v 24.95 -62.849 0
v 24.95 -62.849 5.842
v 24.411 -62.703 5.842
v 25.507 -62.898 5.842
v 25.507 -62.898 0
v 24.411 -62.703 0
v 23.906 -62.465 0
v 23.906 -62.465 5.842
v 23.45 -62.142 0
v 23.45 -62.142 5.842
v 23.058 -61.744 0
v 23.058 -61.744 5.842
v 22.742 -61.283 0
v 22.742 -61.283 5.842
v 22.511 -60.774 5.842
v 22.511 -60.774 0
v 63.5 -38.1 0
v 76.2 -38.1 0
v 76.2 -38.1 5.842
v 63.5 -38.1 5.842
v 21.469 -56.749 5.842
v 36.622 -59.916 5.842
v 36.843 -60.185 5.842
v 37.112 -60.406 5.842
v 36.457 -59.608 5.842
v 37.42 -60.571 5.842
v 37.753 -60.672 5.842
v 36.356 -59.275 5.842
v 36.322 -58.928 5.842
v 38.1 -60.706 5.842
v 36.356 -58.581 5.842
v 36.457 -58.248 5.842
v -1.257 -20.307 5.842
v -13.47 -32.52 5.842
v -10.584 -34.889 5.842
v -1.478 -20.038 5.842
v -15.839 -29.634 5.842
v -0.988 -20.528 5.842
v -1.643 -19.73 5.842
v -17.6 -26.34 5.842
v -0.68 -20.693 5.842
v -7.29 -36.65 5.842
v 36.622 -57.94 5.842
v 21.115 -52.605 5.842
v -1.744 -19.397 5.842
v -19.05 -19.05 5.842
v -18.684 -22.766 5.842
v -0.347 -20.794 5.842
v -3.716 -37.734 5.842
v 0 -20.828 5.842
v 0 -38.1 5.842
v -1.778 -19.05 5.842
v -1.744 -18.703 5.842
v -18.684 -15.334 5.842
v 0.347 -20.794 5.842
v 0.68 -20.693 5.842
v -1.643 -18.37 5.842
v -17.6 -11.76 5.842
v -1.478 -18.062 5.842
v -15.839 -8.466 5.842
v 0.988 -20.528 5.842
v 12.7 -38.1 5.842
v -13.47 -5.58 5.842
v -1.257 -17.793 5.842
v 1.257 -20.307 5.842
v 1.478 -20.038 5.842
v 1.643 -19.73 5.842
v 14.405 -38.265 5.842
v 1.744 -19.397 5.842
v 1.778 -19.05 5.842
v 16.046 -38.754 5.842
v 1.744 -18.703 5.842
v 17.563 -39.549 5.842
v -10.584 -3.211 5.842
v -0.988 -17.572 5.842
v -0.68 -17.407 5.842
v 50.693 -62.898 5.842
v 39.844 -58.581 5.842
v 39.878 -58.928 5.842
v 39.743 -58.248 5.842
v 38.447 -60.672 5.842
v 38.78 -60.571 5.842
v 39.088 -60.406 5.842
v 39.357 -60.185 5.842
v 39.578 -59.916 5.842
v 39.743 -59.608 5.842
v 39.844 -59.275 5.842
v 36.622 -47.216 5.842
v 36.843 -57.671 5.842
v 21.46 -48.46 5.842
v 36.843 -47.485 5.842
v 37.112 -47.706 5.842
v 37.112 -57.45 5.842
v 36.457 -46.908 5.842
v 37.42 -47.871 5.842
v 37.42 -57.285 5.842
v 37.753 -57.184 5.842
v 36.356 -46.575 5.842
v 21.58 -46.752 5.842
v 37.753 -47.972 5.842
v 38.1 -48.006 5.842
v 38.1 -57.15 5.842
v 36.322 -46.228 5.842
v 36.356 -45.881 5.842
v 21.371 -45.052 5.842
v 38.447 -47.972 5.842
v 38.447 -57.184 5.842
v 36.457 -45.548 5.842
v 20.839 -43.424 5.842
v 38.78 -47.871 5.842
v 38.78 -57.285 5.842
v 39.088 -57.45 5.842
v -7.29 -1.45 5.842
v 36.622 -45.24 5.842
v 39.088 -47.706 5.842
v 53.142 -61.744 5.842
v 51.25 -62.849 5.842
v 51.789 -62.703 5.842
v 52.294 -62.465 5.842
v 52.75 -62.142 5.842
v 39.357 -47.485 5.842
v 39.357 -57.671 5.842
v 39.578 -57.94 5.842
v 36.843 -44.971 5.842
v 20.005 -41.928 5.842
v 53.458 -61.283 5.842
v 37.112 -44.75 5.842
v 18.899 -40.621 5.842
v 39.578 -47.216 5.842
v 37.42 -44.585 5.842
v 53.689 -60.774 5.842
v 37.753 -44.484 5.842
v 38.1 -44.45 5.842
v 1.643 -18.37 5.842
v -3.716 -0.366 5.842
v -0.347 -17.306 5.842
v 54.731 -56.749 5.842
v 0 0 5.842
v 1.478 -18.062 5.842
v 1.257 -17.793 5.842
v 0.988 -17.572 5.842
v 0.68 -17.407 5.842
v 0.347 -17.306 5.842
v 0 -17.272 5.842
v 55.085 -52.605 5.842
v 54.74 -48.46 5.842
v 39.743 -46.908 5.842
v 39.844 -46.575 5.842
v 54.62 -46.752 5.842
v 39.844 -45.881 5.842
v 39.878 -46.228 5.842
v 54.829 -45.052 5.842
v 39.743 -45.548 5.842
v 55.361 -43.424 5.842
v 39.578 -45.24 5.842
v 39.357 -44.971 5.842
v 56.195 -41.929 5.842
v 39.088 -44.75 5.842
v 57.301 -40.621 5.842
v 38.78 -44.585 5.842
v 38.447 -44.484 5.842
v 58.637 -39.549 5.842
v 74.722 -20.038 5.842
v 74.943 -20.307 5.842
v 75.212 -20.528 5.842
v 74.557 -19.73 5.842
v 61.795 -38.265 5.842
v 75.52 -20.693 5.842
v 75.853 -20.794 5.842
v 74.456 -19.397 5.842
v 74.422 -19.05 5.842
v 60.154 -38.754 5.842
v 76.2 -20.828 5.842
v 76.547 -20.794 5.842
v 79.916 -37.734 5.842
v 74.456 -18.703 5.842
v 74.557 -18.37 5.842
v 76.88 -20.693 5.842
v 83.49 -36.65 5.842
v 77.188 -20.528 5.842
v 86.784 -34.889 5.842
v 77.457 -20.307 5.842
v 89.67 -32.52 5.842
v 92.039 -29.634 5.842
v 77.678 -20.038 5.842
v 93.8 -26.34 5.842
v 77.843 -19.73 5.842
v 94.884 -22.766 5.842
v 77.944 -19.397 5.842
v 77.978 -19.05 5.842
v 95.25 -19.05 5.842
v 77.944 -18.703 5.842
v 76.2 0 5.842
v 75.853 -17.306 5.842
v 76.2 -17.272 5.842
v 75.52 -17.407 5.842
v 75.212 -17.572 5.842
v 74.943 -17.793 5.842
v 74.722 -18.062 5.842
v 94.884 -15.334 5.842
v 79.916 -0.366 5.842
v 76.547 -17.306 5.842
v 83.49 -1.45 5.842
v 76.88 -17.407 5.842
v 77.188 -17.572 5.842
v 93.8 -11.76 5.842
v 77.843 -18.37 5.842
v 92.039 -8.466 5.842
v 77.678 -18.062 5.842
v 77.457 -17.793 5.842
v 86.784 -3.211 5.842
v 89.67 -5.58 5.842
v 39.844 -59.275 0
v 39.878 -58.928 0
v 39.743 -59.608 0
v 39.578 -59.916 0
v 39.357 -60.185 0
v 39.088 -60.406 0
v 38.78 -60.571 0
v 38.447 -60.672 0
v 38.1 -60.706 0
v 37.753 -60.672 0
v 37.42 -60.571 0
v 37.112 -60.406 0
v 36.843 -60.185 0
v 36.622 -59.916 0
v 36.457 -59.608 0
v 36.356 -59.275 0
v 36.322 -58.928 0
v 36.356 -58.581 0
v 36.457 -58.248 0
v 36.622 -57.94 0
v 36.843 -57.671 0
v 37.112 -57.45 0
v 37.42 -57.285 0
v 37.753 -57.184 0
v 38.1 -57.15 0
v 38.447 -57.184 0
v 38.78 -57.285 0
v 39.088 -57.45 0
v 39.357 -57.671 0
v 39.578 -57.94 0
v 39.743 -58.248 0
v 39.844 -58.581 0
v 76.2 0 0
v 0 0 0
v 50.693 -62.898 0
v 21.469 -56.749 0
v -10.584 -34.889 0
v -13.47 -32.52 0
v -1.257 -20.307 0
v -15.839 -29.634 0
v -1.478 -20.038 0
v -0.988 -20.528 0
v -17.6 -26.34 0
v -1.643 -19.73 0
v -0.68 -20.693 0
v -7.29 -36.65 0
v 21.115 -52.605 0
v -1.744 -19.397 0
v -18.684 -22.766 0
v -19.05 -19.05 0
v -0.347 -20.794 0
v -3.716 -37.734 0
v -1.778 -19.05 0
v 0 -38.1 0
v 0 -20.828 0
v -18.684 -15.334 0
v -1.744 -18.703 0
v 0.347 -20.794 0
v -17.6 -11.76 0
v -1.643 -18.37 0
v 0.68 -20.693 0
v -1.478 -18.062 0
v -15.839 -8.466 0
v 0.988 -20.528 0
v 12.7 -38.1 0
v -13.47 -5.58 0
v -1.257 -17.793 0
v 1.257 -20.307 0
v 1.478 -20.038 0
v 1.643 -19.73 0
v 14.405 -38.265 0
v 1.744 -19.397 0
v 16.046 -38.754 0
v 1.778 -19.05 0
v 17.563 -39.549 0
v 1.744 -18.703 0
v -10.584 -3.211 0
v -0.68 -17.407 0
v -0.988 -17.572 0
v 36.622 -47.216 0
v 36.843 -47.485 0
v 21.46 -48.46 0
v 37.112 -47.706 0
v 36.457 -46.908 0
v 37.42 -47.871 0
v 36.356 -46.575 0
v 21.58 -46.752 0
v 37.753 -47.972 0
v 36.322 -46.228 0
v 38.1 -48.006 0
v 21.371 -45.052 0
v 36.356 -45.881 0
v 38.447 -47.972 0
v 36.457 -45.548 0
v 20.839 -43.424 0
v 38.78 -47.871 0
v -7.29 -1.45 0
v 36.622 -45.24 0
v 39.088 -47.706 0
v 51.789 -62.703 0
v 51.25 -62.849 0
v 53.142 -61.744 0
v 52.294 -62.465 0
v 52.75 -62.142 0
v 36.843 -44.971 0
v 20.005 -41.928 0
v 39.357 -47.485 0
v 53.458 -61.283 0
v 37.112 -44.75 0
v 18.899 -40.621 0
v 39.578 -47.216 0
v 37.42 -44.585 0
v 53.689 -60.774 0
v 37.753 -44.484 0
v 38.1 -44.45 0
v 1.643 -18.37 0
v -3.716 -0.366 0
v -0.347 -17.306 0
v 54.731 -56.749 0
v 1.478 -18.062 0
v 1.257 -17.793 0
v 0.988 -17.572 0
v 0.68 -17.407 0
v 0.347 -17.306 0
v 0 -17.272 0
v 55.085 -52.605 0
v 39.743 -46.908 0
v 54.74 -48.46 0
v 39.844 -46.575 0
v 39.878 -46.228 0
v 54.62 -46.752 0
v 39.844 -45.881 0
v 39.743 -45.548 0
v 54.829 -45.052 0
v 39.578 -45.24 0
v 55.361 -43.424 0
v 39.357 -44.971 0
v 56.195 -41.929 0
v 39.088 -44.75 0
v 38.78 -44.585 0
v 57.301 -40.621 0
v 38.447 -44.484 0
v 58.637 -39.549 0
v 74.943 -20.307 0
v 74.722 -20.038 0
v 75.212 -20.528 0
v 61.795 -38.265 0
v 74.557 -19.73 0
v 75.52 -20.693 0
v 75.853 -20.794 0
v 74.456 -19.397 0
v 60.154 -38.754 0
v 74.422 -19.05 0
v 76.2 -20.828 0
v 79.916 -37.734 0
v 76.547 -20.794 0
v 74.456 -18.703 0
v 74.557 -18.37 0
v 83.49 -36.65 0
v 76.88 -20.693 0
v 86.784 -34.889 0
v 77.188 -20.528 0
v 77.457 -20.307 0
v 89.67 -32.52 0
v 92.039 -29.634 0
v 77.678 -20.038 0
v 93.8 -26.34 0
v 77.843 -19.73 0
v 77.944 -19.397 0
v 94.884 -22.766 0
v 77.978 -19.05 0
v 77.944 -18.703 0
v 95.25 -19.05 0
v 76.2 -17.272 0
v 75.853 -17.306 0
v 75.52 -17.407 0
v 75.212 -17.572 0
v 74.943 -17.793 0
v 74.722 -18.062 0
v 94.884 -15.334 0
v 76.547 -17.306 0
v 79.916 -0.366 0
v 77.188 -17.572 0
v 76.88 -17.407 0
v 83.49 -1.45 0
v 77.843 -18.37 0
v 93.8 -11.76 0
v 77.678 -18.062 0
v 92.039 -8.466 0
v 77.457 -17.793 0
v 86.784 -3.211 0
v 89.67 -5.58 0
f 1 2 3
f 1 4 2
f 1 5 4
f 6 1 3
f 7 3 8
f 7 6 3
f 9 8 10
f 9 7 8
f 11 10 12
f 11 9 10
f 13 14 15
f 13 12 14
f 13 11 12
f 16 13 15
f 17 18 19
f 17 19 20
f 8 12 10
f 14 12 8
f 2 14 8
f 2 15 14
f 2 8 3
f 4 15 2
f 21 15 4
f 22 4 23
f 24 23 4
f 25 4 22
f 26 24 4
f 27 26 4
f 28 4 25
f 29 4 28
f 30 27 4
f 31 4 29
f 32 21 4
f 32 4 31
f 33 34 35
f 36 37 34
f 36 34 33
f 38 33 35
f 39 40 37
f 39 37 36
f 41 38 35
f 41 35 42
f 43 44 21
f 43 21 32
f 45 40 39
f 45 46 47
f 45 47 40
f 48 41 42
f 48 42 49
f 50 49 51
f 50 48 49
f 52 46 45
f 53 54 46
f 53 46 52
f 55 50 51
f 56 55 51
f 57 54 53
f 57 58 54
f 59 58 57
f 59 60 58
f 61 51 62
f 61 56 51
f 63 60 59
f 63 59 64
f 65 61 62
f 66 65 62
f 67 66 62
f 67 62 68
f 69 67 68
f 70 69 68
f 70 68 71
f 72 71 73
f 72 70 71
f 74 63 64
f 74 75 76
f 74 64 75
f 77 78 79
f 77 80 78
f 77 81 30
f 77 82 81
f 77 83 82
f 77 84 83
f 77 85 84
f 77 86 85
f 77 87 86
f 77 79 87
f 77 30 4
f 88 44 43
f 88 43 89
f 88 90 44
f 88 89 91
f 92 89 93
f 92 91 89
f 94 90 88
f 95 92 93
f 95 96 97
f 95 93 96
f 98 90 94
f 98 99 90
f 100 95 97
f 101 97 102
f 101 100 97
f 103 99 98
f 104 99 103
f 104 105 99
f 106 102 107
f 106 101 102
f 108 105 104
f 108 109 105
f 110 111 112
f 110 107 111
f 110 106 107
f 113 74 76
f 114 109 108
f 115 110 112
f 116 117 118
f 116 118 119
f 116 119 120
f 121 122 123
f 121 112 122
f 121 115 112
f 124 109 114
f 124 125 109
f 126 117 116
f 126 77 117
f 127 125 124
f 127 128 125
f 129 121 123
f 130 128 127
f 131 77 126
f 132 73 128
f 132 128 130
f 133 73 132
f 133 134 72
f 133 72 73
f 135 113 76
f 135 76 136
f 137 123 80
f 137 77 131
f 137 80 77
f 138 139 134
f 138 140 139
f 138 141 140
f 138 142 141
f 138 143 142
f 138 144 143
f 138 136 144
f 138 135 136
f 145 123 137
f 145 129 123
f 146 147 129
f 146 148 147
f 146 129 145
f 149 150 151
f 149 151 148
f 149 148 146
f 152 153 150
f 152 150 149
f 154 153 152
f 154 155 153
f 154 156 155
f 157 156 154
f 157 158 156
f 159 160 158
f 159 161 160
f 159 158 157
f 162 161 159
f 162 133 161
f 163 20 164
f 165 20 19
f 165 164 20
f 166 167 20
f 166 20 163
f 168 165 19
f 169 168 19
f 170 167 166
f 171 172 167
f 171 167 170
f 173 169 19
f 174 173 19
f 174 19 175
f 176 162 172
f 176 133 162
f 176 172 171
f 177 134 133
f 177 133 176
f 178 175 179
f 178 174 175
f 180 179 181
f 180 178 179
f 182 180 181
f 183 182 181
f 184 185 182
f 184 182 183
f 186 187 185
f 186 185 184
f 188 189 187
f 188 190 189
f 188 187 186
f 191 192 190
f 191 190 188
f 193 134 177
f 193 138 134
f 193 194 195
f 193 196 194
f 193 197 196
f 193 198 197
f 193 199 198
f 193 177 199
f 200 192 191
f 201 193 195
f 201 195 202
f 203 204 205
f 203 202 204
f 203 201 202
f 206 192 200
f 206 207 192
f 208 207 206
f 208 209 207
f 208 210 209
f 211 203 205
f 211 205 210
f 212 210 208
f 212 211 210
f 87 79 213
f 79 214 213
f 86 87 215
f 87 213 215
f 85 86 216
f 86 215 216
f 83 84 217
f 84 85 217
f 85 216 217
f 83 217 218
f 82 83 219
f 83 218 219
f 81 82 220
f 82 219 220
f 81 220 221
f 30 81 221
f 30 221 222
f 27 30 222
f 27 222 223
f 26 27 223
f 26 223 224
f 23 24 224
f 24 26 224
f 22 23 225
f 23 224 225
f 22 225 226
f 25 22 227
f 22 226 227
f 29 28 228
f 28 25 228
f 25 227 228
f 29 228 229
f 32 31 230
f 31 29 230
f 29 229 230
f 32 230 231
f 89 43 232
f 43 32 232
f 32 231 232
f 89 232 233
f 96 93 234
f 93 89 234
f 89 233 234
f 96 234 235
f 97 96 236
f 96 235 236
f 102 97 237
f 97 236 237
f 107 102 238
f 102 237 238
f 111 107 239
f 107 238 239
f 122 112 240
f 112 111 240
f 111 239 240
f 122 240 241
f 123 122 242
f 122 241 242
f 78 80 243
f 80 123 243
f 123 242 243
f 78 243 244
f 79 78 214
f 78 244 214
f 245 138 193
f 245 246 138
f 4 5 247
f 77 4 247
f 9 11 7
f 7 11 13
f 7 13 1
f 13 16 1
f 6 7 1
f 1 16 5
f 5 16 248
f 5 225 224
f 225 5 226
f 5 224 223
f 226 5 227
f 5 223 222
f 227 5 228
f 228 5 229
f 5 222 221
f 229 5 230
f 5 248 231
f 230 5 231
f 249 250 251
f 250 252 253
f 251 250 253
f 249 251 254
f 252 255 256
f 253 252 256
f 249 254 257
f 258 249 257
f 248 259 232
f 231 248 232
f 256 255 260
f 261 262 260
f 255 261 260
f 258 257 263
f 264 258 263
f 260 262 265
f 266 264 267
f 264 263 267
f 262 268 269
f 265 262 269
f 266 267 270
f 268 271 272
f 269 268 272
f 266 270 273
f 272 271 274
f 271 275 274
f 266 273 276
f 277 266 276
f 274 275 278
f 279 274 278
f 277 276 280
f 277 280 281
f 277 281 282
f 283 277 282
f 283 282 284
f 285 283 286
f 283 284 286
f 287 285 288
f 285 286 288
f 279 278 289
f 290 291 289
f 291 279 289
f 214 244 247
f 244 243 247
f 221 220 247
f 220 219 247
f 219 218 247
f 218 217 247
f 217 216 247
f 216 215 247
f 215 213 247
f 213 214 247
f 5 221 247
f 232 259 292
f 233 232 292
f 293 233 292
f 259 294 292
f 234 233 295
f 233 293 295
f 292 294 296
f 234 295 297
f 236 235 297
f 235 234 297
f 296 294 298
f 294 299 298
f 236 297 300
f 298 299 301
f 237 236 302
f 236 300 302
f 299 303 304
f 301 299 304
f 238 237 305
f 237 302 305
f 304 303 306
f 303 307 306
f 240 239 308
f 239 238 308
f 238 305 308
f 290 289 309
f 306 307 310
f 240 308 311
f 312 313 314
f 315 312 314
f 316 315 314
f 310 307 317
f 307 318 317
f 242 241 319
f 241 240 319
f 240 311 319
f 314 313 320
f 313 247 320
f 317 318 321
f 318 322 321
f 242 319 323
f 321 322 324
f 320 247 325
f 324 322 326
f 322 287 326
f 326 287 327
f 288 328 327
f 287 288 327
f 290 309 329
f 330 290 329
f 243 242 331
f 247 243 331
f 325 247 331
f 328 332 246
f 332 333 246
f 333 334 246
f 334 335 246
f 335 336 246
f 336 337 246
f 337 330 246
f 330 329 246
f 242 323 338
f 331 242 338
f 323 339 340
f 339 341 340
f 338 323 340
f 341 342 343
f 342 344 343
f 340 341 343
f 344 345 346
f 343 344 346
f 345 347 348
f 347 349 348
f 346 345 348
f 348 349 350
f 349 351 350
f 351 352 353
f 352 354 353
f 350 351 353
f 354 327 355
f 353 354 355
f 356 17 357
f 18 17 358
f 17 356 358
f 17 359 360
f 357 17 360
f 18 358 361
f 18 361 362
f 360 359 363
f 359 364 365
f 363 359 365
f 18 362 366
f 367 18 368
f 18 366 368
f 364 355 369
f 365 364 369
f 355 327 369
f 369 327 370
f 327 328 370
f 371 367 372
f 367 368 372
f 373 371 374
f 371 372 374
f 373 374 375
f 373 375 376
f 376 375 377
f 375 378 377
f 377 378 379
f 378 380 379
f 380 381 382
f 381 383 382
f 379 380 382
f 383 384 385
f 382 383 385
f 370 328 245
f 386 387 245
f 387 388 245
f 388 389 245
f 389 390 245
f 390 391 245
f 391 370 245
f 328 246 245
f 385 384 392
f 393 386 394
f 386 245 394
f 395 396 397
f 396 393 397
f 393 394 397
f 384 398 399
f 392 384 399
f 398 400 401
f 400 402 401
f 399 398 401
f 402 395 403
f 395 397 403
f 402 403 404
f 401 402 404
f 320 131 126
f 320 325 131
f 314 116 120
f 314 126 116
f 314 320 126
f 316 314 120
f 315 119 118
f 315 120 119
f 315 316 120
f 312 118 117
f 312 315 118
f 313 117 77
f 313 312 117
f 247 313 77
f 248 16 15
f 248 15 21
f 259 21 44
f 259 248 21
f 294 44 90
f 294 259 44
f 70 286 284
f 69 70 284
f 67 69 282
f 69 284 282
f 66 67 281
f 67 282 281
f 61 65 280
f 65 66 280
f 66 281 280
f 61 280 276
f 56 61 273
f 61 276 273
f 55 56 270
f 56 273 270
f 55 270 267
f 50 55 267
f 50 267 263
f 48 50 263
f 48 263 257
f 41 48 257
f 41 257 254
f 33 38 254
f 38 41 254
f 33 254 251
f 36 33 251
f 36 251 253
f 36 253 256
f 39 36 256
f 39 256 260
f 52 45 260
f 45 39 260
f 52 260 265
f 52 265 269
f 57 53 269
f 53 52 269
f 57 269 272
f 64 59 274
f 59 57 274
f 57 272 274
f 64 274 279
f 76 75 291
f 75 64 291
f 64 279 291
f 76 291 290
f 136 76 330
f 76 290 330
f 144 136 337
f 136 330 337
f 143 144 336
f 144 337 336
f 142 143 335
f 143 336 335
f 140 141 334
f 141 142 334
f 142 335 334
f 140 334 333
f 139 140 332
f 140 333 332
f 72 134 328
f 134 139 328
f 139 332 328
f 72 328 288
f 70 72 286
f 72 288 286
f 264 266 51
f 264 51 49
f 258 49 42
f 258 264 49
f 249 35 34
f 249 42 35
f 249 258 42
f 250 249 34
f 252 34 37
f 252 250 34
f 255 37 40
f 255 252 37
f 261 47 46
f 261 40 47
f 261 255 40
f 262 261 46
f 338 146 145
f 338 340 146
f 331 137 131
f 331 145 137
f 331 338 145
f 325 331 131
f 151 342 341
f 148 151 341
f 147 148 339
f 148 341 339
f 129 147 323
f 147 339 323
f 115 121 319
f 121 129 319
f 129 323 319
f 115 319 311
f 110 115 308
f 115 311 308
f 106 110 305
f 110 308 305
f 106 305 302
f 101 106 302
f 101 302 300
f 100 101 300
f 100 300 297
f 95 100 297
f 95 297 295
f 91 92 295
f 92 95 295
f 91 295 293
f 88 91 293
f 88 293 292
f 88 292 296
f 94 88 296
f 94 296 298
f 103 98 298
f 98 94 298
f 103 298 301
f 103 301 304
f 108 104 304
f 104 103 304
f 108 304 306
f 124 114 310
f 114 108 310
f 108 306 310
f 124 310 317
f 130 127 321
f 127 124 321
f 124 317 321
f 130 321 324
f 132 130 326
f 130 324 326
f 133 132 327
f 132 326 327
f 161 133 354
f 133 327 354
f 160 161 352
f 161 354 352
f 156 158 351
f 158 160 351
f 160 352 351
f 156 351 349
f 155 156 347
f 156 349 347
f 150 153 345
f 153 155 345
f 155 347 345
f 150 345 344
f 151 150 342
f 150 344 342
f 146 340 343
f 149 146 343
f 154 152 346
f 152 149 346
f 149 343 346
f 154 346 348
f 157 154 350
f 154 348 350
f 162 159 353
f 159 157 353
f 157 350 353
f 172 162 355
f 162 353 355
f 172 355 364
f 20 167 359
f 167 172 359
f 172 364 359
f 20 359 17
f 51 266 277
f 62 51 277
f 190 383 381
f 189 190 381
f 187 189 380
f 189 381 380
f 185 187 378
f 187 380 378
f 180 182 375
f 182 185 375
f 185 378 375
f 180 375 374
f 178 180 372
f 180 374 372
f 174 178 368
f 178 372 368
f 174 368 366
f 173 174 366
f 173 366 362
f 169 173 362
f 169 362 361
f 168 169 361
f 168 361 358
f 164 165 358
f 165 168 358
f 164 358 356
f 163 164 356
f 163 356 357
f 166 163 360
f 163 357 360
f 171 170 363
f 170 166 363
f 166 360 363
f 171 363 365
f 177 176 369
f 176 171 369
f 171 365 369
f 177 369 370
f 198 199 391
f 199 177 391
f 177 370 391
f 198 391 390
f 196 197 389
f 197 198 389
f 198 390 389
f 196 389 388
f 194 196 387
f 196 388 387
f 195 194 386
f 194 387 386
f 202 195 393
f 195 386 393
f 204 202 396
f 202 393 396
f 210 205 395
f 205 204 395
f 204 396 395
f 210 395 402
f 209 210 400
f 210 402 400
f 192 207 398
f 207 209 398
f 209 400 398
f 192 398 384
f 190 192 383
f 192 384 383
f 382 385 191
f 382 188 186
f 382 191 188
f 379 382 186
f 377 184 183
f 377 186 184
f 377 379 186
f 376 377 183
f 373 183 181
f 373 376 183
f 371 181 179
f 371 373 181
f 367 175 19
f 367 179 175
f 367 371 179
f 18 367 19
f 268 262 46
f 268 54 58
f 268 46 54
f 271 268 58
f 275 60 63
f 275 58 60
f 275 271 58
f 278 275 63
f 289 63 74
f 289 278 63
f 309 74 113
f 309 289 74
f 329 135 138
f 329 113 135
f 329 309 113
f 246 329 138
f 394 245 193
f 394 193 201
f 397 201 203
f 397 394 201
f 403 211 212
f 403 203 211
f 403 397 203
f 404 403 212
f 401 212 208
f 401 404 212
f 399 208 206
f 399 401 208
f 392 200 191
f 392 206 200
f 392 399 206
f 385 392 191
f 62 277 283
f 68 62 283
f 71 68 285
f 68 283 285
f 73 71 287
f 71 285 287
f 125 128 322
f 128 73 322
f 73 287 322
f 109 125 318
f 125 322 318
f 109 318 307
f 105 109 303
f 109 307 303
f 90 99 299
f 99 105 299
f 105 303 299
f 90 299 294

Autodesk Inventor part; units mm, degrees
ref_plane "YZ Plane" through (0, 0, 0) normal (1, 0, 0) x (0, 1, 0)
ref_plane "XZ Plane" through (0, 0, 0) normal (0, 1, 0) x (-1, 0, 0)
ref_plane "XY Plane" through (0, 0, 0) normal (0, 0, 1) x (1, 0, 0)
sketch "Sketch1" plane through (0, 0, 0) normal (0, 0, 1) x (1, 0, 0)
  line L0 (0, 0) -> (76.2, 0)
  arc A0 (0, 0) -> (0, -38.1) centre (0, -19.05) ccw
  arc A1 (76.2, -38.1) -> (76.2, 0) centre (76.2, -19.05) ccw
  line L1 (76.2, -38.1) -> (63.5, -38.1)
  line L2 (0, -38.1) -> (12.7, -38.1)
  arc A2 (21.4597, -48.4605) -> (12.7, -38.1) centre (12.7, -46.9833) ccw
  arc A3 (21.4597, -48.4605) -> (22.5109, -60.7745) centre (45.8763, -52.578) ccw
  arc A4 (22.5109, -60.7745) -> (25.5069, -62.8985) centre (25.5069, -59.7235) ccw
  line L3 (25.5069, -62.8985) -> (50.6931, -62.8985)
  circle A5 centre (0, -19.05) radius 1.778
  circle A6 centre (76.2, -19.05) radius 1.778
  line L4 (-19.05, -19.05) -> (-19.05, 0)
  line L5 (95.25, -19.05) -> (95.25, 0)
  line L6 (30.3237, -52.578) -> (45.8763, -52.578)
  circle A7 centre (38.1, -46.228) radius 1.778
  circle A8 centre (38.1, -58.928) radius 1.778
  arc A9 (63.5, -38.1) -> (54.7403, -48.4605) centre (63.5, -46.9833) ccw
  arc A10 (53.6891, -60.7745) -> (54.7403, -48.4605) centre (30.3237, -52.578) ccw
  arc A11 (50.6931, -62.8985) -> (53.6891, -60.7745) centre (50.6931, -59.7235) ccw
  point P0 (23.3871, -62.9395)
  dimension "d0" = 76.2
  dimension "d1" = 38.1
  dimension "d5" = 12.7
  dimension "d6" = 12.7
  dimension "d8" = 3.175
  dimension "d9" = 3.556
  dimension "d10" = 3.556
  dimension "d14" = 19.05
  dimension "d15" = 19.05
  dimension "d16" = 3.556
  dimension "d17" = 6.35
  dimension "d18" = 3.556
  dimension "d19" = 12.7
  dimension "d22" = 6.35
extrude "Extrusion3" add sketch "Sketch1" along normal blind 5.842
properties part number "casing"
